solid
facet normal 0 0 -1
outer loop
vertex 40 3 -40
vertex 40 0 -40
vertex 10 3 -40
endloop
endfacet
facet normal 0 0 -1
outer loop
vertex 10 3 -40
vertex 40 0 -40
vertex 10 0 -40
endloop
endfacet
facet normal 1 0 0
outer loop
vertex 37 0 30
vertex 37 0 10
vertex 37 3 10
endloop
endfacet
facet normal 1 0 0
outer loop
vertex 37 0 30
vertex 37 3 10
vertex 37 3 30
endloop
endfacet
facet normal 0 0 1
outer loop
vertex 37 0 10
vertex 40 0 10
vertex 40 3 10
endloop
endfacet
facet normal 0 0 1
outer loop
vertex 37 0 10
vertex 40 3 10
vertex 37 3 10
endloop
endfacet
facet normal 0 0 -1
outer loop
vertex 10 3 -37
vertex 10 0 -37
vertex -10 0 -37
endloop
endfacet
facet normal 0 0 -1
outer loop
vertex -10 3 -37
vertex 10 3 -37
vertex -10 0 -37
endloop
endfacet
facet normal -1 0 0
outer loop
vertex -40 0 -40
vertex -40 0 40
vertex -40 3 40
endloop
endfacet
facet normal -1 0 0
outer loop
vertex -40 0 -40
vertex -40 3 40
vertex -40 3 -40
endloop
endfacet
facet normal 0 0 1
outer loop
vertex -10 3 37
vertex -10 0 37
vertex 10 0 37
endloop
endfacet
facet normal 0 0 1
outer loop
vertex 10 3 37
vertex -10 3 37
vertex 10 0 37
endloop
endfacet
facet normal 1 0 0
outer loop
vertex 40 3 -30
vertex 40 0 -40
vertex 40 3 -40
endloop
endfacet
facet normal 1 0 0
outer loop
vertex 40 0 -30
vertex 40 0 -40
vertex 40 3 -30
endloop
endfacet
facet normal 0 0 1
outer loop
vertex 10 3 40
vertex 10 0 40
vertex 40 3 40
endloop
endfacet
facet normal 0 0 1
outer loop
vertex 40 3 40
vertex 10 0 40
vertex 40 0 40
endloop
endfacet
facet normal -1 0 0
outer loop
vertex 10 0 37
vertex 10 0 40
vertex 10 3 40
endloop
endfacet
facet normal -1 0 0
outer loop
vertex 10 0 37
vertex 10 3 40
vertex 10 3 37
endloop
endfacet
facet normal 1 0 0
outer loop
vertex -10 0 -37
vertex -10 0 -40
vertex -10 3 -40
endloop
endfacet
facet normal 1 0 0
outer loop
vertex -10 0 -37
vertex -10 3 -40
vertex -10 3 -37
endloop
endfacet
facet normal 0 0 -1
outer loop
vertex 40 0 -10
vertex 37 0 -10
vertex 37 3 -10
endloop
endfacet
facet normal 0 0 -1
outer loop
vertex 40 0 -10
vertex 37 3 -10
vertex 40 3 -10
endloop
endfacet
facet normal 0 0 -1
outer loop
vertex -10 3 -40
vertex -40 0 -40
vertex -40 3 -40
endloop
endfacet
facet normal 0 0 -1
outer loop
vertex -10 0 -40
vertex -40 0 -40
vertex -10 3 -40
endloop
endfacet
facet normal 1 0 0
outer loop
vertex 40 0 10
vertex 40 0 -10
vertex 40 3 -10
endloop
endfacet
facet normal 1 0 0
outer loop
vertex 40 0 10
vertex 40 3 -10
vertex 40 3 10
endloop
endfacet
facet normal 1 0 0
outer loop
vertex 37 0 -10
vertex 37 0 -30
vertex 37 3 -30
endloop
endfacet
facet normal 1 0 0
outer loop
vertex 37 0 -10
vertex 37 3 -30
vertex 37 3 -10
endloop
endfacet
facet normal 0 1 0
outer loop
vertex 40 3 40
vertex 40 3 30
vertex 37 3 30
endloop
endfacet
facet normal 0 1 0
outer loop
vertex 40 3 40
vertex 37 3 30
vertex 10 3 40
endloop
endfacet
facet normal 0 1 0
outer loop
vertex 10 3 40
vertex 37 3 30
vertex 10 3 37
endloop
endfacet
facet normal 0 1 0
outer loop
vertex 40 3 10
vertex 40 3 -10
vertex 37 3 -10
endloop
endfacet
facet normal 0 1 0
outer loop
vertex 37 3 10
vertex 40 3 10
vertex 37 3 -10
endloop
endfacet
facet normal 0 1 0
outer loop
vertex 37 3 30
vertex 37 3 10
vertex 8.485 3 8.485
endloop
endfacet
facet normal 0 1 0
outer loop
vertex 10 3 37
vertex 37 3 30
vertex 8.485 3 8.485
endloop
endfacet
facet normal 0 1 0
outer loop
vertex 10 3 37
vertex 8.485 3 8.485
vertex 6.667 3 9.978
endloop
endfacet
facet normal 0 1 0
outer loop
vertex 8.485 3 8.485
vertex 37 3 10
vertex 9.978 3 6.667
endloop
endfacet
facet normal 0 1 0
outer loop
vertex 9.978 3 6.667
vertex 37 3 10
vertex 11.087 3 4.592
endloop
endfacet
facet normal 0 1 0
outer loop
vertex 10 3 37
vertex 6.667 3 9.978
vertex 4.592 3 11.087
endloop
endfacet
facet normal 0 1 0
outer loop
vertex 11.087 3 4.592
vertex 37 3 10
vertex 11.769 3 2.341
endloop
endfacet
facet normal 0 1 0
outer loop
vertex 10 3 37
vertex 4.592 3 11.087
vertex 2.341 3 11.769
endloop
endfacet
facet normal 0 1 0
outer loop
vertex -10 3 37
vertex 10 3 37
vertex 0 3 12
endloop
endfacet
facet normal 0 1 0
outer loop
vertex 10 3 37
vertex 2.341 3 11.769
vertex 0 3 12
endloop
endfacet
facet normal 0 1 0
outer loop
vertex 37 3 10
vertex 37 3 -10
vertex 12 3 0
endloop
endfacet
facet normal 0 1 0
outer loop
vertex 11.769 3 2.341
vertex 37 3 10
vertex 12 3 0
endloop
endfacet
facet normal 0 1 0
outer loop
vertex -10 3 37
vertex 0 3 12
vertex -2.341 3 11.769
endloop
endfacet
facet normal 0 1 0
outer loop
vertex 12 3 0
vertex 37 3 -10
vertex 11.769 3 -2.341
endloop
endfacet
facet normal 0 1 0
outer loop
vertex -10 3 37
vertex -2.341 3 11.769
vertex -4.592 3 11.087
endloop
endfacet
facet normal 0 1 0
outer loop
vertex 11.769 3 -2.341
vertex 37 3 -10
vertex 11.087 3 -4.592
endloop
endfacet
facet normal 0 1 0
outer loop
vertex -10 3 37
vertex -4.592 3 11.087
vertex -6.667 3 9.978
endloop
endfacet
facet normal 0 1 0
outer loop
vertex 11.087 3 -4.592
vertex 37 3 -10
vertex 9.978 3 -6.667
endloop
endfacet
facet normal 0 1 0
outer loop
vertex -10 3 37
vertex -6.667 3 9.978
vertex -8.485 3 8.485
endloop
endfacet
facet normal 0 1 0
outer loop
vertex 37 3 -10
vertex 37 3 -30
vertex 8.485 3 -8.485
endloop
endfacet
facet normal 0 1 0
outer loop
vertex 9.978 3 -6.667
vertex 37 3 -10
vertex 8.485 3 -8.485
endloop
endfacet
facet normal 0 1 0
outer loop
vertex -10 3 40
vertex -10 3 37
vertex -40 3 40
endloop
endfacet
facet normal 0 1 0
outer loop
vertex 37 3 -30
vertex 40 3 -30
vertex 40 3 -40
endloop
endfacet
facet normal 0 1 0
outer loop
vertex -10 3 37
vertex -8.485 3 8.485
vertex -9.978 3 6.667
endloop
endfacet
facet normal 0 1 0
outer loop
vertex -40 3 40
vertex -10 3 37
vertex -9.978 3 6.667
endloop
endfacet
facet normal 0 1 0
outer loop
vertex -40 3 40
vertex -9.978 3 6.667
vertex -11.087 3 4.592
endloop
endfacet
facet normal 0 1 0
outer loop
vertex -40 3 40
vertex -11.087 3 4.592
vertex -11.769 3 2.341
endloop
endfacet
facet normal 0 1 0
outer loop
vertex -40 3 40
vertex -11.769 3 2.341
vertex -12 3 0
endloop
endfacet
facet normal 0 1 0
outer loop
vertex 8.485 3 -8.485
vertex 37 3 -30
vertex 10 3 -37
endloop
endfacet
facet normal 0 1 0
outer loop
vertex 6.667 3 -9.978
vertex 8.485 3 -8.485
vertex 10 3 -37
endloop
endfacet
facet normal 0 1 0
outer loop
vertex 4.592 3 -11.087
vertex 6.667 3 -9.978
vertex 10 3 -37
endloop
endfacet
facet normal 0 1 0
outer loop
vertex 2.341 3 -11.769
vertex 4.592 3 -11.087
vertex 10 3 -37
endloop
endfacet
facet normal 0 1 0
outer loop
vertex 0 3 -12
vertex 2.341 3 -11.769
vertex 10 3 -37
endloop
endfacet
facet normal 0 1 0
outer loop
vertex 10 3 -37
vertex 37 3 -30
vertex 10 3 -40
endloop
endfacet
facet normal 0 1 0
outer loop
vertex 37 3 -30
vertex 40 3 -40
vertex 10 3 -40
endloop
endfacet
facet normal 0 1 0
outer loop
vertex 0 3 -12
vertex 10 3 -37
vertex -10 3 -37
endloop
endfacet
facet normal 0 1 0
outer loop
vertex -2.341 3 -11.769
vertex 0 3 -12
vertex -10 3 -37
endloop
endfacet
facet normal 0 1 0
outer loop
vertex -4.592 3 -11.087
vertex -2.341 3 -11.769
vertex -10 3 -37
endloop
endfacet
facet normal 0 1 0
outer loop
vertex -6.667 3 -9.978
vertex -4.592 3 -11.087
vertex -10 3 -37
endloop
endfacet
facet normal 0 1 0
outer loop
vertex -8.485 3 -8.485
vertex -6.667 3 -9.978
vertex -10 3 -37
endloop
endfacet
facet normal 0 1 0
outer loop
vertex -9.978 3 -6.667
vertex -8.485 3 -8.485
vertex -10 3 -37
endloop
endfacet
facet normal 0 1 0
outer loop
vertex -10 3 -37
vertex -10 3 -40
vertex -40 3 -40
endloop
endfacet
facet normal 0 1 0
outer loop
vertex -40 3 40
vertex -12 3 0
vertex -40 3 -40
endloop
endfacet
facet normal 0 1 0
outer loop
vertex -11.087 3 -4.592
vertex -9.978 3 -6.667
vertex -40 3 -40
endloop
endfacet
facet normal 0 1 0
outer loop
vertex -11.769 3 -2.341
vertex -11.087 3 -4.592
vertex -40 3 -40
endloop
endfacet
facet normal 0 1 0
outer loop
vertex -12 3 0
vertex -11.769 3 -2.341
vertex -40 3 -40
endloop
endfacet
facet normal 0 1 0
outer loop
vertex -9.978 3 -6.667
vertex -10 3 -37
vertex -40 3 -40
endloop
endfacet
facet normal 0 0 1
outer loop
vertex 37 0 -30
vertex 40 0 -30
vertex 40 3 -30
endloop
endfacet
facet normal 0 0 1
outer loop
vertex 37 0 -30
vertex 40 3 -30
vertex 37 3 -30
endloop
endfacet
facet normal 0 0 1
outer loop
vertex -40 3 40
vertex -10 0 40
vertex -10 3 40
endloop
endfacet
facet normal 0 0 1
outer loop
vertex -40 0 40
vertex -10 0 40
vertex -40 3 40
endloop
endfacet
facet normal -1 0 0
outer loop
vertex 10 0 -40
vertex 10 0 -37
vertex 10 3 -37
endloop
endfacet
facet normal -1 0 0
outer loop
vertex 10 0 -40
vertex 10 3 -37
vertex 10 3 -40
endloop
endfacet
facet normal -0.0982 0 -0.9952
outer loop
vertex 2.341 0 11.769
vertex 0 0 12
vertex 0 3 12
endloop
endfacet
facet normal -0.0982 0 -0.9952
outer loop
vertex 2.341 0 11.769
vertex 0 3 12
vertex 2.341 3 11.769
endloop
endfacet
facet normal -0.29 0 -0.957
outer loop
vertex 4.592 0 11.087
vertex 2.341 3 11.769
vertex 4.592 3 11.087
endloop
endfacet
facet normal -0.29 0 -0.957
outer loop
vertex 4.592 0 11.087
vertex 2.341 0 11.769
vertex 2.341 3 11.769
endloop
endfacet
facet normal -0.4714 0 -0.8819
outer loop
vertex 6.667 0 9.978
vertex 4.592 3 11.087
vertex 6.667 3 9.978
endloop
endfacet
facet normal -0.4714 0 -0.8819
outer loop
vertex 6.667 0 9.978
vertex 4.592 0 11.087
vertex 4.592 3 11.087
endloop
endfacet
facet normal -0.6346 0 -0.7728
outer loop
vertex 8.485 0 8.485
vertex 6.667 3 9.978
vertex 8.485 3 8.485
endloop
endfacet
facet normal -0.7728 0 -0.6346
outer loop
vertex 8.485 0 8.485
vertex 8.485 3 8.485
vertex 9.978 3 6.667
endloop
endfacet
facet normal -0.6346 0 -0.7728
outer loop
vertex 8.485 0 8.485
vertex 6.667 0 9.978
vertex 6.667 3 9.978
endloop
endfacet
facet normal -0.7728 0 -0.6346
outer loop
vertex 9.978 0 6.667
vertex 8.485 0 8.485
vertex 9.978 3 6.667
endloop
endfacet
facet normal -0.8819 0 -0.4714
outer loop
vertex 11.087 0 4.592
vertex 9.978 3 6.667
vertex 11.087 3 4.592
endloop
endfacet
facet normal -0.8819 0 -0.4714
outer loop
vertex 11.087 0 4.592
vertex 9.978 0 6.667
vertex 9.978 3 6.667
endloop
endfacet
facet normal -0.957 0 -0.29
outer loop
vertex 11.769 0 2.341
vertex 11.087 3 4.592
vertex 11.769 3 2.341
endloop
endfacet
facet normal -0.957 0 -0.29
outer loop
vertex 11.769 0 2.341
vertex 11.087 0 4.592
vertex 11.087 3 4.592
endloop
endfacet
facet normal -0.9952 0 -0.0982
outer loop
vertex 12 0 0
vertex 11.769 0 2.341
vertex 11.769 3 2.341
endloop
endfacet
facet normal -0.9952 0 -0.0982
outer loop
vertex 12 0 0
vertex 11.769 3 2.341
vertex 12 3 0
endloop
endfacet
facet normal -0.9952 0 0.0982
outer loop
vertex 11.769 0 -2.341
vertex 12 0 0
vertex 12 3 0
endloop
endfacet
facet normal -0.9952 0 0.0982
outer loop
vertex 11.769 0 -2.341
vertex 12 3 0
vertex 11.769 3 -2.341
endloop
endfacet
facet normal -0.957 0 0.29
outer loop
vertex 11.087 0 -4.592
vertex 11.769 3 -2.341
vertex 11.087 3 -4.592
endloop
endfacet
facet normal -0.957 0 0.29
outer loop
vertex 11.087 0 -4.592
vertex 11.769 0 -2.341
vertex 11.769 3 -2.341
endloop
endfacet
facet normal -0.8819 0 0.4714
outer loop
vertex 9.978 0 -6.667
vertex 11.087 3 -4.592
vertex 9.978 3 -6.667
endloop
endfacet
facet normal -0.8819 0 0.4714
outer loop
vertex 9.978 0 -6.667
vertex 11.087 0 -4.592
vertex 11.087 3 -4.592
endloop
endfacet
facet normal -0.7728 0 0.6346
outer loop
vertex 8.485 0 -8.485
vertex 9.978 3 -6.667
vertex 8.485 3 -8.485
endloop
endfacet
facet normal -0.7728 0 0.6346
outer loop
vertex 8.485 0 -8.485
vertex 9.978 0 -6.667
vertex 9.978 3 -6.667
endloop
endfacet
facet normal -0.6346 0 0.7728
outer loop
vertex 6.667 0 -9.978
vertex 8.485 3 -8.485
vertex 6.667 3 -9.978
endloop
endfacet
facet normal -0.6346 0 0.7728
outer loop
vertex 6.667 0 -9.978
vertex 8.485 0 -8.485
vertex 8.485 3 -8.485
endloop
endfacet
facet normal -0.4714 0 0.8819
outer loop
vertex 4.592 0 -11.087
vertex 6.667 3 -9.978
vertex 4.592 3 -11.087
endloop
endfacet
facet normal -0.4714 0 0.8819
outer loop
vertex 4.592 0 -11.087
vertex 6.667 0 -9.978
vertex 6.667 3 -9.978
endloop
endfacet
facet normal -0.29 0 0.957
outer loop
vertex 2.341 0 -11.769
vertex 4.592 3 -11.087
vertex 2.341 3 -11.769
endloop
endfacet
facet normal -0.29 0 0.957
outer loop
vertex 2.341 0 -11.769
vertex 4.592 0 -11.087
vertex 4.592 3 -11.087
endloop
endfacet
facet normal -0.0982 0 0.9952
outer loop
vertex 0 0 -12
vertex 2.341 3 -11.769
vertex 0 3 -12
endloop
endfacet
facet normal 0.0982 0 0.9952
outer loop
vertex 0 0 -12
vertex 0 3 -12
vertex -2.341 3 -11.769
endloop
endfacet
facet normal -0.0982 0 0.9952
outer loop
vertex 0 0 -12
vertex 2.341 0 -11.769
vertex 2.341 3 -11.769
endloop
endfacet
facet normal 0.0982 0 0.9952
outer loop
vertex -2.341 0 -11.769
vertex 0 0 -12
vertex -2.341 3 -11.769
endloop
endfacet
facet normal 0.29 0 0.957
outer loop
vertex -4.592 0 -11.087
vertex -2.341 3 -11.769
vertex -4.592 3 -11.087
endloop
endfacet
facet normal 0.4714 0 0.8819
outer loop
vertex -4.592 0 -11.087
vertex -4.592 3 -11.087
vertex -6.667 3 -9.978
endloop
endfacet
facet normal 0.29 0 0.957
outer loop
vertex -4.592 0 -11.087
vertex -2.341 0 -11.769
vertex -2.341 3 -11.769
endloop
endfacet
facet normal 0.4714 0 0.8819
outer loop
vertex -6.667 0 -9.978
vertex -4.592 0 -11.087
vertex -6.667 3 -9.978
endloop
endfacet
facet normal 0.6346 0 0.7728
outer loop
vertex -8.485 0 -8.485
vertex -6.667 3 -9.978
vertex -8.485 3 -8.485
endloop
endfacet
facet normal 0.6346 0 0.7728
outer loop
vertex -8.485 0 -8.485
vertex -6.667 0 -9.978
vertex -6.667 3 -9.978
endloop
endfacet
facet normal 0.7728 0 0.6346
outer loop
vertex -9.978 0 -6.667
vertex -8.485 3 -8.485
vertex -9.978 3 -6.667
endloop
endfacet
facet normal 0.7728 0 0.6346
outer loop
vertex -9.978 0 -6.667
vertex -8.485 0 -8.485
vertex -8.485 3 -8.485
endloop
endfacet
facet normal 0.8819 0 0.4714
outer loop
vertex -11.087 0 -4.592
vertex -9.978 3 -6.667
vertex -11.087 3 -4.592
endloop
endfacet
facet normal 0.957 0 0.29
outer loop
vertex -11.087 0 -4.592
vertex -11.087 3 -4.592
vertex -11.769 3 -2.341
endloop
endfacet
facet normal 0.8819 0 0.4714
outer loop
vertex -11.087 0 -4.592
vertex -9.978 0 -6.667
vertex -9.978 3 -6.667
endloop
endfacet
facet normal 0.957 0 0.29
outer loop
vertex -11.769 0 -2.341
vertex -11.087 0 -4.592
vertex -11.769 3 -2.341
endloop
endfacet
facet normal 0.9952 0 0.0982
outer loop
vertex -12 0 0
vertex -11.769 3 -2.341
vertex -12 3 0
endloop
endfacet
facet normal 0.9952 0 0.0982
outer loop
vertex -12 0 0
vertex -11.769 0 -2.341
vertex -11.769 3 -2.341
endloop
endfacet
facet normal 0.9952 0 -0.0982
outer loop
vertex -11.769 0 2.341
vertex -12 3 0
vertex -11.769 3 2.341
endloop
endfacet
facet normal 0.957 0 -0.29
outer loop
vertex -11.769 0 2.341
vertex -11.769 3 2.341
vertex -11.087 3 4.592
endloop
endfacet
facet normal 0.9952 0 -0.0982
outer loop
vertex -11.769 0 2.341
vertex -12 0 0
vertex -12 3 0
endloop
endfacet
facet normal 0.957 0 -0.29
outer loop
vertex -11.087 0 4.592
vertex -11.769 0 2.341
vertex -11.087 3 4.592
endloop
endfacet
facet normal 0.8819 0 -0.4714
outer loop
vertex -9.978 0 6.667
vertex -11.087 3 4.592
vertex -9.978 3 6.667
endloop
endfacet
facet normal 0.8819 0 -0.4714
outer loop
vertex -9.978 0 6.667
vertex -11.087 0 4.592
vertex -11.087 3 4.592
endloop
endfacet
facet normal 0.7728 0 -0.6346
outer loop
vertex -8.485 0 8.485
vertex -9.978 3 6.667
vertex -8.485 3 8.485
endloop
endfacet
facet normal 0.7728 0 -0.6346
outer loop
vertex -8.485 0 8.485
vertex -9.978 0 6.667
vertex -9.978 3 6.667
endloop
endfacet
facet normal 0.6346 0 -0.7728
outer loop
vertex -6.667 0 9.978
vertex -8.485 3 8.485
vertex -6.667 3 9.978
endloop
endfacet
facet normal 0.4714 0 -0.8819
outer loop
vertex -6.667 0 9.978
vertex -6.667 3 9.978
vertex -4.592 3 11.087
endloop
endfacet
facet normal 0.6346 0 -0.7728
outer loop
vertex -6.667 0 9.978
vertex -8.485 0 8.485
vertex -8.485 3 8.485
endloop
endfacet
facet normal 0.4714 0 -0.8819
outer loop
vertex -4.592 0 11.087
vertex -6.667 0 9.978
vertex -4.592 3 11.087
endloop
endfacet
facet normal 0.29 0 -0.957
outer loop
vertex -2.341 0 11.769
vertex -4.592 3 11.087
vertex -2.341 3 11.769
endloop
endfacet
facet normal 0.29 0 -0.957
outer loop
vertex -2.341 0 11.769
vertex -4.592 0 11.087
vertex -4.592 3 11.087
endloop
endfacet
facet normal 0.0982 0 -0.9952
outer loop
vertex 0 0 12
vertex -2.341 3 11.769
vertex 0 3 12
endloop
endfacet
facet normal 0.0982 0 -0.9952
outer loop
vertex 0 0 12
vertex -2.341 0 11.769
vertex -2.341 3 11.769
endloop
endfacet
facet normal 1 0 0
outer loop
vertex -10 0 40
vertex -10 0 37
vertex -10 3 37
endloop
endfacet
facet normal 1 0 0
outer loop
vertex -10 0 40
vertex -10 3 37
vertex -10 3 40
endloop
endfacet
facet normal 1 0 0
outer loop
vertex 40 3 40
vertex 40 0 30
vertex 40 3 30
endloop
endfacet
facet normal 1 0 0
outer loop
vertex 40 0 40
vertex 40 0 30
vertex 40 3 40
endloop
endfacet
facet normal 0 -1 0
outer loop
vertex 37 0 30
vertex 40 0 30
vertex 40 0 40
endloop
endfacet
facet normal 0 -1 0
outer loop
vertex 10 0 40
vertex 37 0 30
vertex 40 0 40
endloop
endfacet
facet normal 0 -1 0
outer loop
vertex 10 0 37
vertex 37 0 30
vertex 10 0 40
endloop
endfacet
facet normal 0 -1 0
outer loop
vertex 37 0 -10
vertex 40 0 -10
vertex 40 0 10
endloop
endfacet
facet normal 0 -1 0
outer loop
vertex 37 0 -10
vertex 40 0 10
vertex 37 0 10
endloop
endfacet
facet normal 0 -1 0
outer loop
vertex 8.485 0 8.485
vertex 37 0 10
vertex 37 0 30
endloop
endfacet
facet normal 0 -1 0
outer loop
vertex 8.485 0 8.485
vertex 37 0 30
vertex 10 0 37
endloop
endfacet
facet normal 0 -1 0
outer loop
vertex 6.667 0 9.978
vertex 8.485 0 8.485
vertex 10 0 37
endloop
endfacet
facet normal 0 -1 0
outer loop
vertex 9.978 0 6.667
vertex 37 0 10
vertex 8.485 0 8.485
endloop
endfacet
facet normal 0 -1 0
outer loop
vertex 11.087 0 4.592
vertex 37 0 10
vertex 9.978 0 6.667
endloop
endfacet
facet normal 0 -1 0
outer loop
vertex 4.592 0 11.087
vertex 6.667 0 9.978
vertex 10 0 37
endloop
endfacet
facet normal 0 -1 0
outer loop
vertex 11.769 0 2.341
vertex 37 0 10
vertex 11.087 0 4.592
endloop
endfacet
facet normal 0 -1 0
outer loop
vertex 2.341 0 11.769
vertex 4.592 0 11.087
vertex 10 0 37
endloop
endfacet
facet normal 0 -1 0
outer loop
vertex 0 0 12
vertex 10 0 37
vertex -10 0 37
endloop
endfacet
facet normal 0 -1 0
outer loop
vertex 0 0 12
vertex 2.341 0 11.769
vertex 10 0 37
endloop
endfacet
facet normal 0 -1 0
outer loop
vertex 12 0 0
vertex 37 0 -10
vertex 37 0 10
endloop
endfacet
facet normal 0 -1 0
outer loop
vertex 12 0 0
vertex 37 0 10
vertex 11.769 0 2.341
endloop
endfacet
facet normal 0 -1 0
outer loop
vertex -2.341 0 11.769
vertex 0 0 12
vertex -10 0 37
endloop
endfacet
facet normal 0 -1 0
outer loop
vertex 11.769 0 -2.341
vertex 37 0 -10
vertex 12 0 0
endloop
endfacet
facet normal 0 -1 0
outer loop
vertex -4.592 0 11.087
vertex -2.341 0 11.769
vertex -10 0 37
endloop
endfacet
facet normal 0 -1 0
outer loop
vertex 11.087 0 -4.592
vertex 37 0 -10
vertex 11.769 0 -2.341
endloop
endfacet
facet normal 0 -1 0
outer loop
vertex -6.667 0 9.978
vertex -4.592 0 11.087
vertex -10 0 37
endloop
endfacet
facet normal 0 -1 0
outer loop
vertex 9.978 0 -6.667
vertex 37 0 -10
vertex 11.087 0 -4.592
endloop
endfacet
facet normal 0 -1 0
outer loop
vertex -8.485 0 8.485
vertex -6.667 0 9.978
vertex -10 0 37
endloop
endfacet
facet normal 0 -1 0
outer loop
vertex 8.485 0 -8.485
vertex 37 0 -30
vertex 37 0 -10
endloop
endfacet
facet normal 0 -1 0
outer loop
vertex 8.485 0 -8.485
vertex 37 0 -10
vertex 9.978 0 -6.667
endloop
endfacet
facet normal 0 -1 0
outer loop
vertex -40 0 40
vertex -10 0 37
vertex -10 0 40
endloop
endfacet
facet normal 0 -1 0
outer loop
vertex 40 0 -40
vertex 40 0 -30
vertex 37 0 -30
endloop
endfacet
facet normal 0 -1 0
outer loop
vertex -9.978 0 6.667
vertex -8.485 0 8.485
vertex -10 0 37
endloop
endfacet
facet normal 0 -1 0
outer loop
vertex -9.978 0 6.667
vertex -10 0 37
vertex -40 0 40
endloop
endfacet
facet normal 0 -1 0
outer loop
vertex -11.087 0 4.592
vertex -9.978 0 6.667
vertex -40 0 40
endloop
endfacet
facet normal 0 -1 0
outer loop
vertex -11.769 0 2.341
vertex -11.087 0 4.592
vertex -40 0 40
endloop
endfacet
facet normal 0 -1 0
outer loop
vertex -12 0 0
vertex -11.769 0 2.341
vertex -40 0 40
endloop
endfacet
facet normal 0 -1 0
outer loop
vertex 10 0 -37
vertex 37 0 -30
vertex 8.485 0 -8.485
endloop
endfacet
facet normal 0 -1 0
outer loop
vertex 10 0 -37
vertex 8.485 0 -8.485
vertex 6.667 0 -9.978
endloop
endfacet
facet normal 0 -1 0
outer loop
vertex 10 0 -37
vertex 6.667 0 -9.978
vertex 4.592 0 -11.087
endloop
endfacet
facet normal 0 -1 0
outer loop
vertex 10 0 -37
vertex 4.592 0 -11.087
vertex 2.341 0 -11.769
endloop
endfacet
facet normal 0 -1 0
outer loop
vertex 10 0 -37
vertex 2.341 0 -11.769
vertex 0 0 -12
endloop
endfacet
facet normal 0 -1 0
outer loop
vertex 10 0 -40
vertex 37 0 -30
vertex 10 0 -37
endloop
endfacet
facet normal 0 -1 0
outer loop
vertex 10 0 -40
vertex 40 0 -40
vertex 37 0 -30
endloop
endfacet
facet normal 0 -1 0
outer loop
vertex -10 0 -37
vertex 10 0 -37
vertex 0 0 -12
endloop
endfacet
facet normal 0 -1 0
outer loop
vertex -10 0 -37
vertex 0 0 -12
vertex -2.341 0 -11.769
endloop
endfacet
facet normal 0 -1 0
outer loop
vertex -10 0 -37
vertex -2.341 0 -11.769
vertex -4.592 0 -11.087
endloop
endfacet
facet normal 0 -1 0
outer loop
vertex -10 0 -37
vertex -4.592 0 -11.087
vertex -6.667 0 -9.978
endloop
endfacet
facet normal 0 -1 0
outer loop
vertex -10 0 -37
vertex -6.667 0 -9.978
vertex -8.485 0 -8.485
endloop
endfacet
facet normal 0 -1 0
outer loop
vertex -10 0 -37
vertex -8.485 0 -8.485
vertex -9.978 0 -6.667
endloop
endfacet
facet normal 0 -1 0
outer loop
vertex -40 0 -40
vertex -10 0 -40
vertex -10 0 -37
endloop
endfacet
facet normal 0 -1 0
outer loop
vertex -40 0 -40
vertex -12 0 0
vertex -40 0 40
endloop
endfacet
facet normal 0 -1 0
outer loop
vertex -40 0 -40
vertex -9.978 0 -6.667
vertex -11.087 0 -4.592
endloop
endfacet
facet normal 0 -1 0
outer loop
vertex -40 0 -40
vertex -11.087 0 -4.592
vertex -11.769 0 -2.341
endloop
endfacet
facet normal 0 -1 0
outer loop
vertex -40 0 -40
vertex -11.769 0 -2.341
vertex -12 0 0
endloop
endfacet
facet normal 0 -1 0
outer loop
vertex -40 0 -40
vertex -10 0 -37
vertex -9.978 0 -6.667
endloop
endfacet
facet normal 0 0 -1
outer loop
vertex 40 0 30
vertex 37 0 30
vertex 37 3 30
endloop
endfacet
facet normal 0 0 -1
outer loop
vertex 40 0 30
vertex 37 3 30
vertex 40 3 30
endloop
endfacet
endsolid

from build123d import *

# Parameters (mm, degrees)
CROQUIS1_R              = 12
SALIENTE_EXTRUIR1_DEPTH = 3


with BuildPart() as part:
    # Croquis1 → Saliente-Extruir1 (new body)
    with BuildSketch(Plane(origin=(0, 0, 0), x_dir=(1, 0, 0), z_dir=(0, 1, 0))):
        Polygon((-40, 40), (-10, 40), (-10, 37), (0, 37), (10, 37), (10, 40), (37, 40), (40, 40), (40, 30), (37, 30), (37, 10), (40, 10), (40, -10), (37, -10), (37, -30), (40, -30), (40, -40), (37, -40), (10, -40), (10, -37), (0, -37), (-10, -37), (-10, -40), (-40, -40), align=None)
        with Locations(Location((0, 0, 0), (0, 0, 270))):
            Circle(CROQUIS1_R, mode=Mode.SUBTRACT)
    extrude(amount=SALIENTE_EXTRUIR1_DEPTH)


solid = part.part
